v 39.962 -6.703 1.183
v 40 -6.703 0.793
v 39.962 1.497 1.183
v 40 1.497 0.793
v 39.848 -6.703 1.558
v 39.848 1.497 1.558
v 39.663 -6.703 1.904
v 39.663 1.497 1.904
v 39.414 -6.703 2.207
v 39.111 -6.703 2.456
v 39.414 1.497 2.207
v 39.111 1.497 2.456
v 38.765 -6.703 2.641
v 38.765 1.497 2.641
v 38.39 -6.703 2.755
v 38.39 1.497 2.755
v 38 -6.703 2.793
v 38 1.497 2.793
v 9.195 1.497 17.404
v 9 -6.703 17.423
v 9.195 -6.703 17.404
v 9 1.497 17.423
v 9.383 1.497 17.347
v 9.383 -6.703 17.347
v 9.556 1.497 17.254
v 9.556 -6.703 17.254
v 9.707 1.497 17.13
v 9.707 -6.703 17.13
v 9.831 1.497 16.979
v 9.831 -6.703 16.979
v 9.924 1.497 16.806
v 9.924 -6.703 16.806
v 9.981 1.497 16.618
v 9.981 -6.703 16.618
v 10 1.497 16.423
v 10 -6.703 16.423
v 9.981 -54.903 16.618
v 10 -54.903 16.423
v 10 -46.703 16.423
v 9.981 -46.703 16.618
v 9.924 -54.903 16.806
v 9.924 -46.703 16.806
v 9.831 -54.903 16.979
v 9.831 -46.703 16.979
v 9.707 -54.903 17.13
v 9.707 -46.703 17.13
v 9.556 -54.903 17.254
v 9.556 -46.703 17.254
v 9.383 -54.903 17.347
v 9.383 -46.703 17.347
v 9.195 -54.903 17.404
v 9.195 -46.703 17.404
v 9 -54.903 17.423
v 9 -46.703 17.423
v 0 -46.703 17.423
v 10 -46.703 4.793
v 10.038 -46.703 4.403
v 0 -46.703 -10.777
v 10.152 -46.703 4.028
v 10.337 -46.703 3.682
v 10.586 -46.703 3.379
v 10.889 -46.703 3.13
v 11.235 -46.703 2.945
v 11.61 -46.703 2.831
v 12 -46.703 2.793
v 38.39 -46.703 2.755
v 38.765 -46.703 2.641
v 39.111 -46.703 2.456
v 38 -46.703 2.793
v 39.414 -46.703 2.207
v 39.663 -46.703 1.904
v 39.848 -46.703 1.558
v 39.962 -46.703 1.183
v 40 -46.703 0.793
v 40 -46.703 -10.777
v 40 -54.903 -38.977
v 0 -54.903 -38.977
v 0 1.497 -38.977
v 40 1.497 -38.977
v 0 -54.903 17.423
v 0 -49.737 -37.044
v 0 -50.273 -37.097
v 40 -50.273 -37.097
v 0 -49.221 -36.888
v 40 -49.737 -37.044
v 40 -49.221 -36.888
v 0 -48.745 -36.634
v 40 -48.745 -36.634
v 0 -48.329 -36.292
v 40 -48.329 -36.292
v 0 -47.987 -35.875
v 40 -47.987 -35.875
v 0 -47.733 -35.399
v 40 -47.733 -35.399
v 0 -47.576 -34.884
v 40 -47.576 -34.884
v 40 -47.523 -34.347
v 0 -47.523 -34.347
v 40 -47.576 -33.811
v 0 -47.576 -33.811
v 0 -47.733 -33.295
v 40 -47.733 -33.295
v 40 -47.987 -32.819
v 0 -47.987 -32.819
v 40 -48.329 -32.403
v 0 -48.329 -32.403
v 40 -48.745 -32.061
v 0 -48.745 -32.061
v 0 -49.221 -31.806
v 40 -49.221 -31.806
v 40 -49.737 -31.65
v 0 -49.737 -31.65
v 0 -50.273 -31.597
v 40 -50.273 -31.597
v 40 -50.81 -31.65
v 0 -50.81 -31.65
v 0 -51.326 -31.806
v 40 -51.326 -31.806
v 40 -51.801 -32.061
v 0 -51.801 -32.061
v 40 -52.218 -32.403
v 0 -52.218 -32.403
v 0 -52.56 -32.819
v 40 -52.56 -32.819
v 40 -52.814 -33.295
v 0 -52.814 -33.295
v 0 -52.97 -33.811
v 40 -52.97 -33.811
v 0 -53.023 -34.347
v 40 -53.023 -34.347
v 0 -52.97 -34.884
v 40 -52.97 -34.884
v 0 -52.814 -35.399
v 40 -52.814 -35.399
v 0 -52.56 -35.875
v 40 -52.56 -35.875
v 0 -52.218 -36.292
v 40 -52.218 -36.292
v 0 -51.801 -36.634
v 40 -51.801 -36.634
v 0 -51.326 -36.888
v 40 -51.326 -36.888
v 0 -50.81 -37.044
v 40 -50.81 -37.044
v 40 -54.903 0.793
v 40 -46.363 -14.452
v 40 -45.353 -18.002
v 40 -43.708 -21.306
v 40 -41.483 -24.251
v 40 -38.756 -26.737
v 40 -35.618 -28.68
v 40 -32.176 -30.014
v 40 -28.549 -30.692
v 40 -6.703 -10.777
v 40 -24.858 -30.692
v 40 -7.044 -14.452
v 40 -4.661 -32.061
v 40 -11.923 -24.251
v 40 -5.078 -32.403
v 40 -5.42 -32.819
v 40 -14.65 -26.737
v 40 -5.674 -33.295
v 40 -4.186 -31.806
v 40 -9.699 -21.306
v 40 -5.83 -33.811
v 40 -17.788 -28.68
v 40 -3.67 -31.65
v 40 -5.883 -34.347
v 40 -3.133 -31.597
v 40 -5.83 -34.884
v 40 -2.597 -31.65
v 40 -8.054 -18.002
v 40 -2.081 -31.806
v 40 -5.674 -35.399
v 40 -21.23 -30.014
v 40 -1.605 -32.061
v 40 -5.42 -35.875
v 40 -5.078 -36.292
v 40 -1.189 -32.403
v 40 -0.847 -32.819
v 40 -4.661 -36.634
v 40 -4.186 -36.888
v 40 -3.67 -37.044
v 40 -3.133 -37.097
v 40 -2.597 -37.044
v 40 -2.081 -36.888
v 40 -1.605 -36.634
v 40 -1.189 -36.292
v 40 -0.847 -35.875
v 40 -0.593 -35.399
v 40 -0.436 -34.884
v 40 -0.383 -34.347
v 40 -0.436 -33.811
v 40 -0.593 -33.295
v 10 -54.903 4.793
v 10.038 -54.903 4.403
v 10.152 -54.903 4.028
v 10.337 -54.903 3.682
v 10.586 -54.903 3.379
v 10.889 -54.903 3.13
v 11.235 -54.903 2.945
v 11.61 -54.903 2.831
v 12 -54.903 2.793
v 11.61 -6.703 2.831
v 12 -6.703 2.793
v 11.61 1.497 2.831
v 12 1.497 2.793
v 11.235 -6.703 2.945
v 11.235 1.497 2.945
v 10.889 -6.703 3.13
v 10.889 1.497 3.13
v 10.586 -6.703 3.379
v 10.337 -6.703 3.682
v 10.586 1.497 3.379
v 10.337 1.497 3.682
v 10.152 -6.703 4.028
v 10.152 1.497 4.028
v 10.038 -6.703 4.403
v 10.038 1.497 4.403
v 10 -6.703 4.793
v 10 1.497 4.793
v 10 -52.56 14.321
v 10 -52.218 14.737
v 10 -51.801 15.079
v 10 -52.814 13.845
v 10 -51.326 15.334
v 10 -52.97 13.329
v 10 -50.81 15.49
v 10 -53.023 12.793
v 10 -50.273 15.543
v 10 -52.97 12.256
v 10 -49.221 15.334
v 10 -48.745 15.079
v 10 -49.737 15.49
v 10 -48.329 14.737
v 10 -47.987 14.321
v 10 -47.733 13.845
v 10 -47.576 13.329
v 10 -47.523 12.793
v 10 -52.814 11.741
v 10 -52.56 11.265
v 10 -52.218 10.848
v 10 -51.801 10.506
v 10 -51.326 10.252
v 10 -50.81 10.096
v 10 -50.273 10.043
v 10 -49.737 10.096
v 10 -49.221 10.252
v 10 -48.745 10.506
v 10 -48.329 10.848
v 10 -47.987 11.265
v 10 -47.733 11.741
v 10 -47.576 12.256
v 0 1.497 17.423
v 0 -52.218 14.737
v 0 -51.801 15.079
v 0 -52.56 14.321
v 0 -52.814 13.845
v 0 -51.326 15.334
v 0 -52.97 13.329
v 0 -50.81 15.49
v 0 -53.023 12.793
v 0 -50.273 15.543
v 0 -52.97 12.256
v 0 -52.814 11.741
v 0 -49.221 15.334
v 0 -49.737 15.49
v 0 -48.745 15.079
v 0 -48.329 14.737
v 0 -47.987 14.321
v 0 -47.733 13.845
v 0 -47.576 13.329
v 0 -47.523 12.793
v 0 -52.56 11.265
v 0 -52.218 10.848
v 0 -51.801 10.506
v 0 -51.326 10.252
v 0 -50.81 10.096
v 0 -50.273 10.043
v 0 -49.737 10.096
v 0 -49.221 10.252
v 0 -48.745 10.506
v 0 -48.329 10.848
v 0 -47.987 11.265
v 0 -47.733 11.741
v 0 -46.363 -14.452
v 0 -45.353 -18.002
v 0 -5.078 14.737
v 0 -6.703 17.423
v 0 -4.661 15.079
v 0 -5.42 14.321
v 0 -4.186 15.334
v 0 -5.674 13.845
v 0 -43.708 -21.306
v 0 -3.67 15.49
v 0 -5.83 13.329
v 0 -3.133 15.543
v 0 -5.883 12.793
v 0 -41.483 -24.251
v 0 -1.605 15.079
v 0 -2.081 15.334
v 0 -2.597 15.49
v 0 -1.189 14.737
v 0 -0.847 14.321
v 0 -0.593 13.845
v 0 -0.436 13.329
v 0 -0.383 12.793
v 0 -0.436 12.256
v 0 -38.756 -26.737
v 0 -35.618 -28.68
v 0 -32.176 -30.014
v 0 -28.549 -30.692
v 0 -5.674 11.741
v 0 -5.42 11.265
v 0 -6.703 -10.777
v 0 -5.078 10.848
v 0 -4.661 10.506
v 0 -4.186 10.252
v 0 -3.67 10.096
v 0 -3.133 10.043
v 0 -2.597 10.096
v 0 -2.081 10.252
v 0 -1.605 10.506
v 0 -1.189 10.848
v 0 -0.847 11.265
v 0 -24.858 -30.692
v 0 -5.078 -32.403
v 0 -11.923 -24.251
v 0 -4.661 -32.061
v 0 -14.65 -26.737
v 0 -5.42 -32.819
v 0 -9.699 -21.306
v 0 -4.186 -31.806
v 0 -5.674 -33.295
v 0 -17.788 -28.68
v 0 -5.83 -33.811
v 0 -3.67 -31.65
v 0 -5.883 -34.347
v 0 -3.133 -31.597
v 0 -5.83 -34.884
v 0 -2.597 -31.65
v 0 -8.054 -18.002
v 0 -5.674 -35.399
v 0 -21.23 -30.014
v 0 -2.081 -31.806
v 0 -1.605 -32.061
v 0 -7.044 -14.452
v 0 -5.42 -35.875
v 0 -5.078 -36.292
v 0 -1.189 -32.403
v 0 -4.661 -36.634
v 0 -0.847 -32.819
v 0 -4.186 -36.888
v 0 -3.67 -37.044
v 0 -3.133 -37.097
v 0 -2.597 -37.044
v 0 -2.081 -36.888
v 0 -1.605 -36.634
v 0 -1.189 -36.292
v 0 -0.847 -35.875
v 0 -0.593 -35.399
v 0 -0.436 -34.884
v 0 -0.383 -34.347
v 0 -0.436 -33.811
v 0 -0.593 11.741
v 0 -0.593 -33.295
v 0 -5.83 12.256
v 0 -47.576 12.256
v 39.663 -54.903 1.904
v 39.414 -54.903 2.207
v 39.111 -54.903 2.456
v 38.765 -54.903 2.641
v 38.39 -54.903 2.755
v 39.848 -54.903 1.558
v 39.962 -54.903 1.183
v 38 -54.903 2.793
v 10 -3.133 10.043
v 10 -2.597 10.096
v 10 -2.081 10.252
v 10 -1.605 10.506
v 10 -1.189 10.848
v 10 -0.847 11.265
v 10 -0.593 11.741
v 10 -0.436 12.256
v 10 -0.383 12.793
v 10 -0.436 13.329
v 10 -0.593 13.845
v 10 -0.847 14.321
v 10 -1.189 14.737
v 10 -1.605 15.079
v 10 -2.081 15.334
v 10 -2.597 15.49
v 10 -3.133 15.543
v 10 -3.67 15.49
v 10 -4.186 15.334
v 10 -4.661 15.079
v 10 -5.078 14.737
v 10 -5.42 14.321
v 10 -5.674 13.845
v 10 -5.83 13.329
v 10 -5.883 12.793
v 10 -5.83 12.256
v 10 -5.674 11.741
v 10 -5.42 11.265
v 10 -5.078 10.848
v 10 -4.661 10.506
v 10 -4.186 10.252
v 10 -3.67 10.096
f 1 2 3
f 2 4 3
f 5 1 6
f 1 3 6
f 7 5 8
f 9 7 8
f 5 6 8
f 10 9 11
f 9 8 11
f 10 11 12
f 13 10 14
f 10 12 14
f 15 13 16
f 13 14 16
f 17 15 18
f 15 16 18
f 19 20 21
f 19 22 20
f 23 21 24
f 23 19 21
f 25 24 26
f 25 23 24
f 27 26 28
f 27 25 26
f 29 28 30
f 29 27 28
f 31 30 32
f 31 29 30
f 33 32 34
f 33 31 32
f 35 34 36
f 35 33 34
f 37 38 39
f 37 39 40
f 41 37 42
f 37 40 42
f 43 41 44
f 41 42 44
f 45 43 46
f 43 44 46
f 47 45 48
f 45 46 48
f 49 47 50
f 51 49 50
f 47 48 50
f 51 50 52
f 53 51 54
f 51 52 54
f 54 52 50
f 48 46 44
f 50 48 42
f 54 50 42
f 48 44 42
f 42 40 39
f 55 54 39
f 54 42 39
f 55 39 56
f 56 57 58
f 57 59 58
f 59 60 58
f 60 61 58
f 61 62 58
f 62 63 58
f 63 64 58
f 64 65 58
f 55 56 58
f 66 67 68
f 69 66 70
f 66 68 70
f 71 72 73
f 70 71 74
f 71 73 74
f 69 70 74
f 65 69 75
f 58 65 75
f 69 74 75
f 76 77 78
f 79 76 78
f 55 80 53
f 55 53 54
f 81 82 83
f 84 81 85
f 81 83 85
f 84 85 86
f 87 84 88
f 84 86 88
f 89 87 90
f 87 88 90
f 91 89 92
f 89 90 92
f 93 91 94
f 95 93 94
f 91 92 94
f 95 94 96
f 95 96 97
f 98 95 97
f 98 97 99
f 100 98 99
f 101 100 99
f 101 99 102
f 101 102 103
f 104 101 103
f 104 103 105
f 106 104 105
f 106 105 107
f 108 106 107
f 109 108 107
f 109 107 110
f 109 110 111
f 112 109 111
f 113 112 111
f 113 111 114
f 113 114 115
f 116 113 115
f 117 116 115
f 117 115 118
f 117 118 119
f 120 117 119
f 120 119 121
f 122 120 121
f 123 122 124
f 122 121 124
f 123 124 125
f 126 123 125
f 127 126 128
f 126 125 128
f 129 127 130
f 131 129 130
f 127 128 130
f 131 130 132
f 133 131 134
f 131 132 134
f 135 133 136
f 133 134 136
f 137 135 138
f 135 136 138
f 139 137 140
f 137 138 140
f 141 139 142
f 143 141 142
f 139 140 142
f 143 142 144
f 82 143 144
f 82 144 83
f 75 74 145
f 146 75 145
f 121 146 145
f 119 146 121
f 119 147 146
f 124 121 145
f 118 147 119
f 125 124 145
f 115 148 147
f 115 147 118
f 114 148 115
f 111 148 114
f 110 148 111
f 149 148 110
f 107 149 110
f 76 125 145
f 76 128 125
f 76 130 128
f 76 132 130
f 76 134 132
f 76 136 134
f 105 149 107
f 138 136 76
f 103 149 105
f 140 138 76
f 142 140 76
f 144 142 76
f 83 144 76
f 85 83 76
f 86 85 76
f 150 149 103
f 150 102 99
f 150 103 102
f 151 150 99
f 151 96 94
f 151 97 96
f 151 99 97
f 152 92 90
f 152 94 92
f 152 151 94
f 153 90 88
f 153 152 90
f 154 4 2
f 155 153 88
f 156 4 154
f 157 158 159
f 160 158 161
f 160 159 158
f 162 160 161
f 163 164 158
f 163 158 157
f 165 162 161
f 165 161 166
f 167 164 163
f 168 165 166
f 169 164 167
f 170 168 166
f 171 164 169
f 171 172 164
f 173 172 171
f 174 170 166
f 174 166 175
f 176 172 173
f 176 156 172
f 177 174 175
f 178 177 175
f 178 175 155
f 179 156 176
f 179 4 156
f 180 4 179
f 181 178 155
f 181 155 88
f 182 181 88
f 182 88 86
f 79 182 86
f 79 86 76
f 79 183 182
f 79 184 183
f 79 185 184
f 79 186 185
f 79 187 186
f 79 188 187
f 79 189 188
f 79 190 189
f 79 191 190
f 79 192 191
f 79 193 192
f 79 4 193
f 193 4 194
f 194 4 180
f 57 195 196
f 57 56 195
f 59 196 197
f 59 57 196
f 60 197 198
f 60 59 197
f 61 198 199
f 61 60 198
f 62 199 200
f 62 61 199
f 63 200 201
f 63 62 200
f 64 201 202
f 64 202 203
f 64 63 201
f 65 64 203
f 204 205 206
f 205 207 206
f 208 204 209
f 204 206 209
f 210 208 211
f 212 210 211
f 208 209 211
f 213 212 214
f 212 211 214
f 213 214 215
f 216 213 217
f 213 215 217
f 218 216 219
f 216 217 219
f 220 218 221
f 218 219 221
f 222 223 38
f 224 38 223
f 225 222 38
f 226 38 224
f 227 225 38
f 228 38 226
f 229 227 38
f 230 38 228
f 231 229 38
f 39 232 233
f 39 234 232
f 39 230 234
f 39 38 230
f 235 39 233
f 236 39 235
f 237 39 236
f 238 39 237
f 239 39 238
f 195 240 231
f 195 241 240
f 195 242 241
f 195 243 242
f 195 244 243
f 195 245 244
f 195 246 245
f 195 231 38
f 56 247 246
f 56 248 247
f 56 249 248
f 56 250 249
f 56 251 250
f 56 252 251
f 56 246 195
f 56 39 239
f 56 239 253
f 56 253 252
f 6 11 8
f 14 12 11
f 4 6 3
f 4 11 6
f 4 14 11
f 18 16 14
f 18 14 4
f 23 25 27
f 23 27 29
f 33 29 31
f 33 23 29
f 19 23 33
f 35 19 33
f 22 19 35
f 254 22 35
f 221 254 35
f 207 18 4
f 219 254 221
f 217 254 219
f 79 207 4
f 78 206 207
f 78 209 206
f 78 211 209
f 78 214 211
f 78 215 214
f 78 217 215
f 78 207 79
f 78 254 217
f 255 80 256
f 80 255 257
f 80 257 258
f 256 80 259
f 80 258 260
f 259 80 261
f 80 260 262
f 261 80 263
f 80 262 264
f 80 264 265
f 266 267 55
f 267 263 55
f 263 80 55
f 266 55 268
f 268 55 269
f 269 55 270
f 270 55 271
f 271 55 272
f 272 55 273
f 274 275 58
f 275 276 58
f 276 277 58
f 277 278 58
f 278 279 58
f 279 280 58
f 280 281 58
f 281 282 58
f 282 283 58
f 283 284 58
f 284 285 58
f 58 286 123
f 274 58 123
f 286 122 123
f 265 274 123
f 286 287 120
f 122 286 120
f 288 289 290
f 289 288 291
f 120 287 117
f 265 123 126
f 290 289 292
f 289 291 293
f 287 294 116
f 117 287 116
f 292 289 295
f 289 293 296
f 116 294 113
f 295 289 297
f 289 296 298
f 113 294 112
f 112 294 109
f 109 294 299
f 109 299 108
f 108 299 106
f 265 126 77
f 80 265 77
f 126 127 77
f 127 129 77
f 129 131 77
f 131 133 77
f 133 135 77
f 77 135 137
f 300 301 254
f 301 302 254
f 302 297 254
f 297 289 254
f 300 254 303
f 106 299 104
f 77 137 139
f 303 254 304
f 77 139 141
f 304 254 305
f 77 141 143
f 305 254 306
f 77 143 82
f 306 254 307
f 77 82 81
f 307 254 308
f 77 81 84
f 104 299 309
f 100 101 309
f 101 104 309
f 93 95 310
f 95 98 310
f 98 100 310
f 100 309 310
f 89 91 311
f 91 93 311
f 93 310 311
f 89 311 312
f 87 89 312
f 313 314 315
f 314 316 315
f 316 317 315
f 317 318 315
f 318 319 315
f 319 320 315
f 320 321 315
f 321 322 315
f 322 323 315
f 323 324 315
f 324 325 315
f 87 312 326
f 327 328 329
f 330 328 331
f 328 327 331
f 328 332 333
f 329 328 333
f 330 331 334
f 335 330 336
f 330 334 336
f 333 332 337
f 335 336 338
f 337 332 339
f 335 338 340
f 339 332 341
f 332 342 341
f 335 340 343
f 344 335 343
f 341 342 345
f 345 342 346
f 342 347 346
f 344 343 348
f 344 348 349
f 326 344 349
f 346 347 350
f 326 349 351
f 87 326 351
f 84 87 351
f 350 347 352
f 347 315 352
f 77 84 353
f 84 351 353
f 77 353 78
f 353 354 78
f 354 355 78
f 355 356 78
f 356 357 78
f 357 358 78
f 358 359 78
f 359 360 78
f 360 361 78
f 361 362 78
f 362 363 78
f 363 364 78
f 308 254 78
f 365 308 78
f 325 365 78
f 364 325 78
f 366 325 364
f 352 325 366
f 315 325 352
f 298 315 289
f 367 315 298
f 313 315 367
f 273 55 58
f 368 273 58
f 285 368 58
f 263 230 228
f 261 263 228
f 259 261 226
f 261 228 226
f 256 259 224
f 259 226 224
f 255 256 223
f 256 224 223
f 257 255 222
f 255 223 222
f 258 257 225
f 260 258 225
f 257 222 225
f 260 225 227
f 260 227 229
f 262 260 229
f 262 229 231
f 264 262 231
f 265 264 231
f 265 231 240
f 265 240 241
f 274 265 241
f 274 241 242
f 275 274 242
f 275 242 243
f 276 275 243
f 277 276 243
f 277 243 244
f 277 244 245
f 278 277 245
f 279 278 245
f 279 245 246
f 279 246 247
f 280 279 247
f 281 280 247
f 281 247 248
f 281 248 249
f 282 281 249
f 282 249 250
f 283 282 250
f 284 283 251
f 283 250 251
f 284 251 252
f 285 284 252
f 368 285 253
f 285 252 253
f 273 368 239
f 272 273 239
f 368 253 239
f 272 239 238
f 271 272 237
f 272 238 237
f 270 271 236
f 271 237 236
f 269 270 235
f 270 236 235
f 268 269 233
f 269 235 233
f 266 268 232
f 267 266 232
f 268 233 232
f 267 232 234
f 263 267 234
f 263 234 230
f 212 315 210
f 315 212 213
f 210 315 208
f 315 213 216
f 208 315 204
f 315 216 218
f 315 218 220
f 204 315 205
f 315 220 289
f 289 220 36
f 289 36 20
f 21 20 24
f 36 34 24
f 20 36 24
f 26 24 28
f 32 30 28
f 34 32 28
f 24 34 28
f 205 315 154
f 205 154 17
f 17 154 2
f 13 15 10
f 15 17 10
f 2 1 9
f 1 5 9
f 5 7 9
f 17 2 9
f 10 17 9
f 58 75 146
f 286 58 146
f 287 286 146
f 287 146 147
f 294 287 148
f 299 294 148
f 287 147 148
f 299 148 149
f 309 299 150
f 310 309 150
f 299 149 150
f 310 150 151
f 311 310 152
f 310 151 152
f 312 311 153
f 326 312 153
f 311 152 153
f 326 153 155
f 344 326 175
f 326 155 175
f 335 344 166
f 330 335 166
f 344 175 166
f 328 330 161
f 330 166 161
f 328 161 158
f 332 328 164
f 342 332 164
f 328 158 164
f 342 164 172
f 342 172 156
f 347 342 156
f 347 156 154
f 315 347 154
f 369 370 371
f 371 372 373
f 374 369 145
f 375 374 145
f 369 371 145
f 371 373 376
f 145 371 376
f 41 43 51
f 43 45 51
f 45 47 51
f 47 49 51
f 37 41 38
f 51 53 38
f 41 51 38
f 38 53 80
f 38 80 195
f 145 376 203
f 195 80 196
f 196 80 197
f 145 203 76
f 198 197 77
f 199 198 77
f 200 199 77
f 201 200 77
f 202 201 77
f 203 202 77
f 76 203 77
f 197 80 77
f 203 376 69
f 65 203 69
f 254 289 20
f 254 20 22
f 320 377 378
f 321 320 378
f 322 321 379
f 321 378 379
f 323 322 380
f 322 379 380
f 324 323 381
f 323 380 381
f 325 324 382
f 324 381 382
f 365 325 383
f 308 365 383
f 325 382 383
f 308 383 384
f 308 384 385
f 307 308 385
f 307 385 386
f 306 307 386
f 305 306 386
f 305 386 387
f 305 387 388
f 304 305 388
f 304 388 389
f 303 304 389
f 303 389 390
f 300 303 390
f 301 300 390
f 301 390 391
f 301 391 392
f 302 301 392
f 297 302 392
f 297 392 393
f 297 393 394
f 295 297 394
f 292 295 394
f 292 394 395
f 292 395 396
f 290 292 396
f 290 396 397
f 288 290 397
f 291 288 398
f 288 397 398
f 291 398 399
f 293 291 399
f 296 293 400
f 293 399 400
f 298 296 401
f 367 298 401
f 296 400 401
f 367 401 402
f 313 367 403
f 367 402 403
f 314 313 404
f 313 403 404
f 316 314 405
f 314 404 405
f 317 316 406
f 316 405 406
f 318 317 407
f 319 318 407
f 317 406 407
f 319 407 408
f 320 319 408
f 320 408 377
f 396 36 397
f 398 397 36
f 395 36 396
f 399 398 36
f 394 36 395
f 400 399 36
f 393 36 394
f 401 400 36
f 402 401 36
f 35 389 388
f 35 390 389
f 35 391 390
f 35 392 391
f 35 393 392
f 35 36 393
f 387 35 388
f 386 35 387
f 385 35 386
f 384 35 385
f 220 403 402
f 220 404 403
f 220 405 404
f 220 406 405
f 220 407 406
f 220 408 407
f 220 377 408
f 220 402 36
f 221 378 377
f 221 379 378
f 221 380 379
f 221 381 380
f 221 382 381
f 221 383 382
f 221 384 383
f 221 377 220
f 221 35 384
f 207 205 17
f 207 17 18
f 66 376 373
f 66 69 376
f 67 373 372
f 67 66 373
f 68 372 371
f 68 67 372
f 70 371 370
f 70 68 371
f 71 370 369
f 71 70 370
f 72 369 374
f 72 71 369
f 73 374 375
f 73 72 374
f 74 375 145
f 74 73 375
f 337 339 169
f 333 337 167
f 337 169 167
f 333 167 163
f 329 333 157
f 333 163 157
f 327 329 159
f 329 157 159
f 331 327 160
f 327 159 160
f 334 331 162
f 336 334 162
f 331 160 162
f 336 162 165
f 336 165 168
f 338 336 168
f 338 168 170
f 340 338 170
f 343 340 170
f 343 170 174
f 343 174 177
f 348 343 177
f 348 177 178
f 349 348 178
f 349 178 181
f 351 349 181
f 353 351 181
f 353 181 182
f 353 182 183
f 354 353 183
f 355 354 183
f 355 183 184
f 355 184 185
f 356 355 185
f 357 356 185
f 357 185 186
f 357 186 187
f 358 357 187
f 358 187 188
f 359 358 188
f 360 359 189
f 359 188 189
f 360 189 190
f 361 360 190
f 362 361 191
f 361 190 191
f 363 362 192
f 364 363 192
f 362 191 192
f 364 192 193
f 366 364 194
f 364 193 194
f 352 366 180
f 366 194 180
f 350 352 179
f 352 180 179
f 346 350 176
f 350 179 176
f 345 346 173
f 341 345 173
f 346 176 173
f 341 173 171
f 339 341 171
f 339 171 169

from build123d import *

# Parameters (mm, degrees)
SKETCH1_W           = 56.4
SKETCH1_H           = 56.4
BOSS_EXTRUDE1_DEPTH = 40
SKETCH2_R           = 2.75
CUT_EXTRUDE1_DEPTH  = 79.317122537
CUT_EXTRUDE3_DEPTH  = 79.317122537
SKETCH5_W           = 14.63
SKETCH5_H           = 8.2
CUT_EXTRUDE4_DEPTH  = 30
FILLET1_R           = 2
FILLET2_R           = 2
FILLET3_R           = 1


with BuildPart() as part:
    # Sketch1 → Boss-Extrude1 (new body)
    with BuildSketch(Plane(origin=(0, 0, 0), x_dir=(0, 0, -1), z_dir=(1, 0, 0))):
        with Locations((10.777070064, -26.703184713)):
            Rectangle(SKETCH1_W, SKETCH1_H)
    extrude(amount=BOSS_EXTRUDE1_DEPTH)

    # Sketch2 → Cut-Extrude1 (cut, through all)
    with BuildSketch(Plane(origin=(40, 0, 0), x_dir=(0, 0, -1), z_dir=(1, 0, 0))):
        with Locations((-12.792929936, -3.133184713)):
            Circle(SKETCH2_R)
        with Locations(Location((-12.792929936, -50.273184713, 0), (0, 0, 180))):
            Circle(SKETCH2_R)
        with Locations(Location((34.347070064, -3.133184713, 0), (0, 0, 180))):
            Circle(SKETCH2_R)
        with Locations((34.347070064, -50.273184713)):
            Circle(SKETCH2_R)
    extrude(amount=-CUT_EXTRUDE1_DEPTH, mode=Mode.SUBTRACT)

    # Sketch4 → Cut-Extrude3 (cut, through all)
    with BuildSketch(Plane(origin=(40, 0, 0), x_dir=(0, 0, -1), z_dir=(1, 0, 0))):
        with BuildLine():
            Line((10.777070064, -6.703184713), (-17.422929936, -6.703184713))
            Line((-17.422929936, -6.703184713), (-17.422929936, -46.703184713))
            Line((-17.422929936, -46.703184713), (10.777070064, -46.703184713))
            ThreePointArc((10.777070064, -46.703184713), (30.777070064, -26.703184713), (10.777070064, -6.703184713))
        make_face()
    extrude(amount=-CUT_EXTRUDE3_DEPTH, mode=Mode.SUBTRACT)

    # Sketch5 → Cut-Extrude4 (cut)
    with BuildSketch(Plane(origin=(40, 0, 0), x_dir=(0, 0, -1), z_dir=(1, 0, 0))):
        with Locations((-10.107929936, -2.603184713)):
            Rectangle(SKETCH5_W, SKETCH5_H)
        with Locations((-10.107929936, -50.803184713)):
            Rectangle(SKETCH5_W, SKETCH5_H)
    extrude(amount=-CUT_EXTRUDE4_DEPTH, mode=Mode.SUBTRACT)

    # Fillet1
    fillet1_edges = [part.edges().sort_by_distance(p)[0] for p in [
        (10, -2.603184713, 2.792929936),
        (10, -50.803184713, 2.792929936),
    ]]
    fillet(fillet1_edges, radius=FILLET1_R)

    # Fillet2
    fillet2_edges = [part.edges().sort_by_distance(p)[0] for p in [
        (40, -2.603184713, 2.792929936),
        (40, -50.803184713, 2.792929936),
    ]]
    fillet(fillet2_edges, radius=FILLET2_R)

    # Fillet3
    fillet3_edges = [part.edges().sort_by_distance(p)[0] for p in [
        (10, -2.603184713, 17.422929936),
        (10, -50.803184713, 17.422929936),
    ]]
    fillet(fillet3_edges, radius=FILLET3_R)


solid = part.part
